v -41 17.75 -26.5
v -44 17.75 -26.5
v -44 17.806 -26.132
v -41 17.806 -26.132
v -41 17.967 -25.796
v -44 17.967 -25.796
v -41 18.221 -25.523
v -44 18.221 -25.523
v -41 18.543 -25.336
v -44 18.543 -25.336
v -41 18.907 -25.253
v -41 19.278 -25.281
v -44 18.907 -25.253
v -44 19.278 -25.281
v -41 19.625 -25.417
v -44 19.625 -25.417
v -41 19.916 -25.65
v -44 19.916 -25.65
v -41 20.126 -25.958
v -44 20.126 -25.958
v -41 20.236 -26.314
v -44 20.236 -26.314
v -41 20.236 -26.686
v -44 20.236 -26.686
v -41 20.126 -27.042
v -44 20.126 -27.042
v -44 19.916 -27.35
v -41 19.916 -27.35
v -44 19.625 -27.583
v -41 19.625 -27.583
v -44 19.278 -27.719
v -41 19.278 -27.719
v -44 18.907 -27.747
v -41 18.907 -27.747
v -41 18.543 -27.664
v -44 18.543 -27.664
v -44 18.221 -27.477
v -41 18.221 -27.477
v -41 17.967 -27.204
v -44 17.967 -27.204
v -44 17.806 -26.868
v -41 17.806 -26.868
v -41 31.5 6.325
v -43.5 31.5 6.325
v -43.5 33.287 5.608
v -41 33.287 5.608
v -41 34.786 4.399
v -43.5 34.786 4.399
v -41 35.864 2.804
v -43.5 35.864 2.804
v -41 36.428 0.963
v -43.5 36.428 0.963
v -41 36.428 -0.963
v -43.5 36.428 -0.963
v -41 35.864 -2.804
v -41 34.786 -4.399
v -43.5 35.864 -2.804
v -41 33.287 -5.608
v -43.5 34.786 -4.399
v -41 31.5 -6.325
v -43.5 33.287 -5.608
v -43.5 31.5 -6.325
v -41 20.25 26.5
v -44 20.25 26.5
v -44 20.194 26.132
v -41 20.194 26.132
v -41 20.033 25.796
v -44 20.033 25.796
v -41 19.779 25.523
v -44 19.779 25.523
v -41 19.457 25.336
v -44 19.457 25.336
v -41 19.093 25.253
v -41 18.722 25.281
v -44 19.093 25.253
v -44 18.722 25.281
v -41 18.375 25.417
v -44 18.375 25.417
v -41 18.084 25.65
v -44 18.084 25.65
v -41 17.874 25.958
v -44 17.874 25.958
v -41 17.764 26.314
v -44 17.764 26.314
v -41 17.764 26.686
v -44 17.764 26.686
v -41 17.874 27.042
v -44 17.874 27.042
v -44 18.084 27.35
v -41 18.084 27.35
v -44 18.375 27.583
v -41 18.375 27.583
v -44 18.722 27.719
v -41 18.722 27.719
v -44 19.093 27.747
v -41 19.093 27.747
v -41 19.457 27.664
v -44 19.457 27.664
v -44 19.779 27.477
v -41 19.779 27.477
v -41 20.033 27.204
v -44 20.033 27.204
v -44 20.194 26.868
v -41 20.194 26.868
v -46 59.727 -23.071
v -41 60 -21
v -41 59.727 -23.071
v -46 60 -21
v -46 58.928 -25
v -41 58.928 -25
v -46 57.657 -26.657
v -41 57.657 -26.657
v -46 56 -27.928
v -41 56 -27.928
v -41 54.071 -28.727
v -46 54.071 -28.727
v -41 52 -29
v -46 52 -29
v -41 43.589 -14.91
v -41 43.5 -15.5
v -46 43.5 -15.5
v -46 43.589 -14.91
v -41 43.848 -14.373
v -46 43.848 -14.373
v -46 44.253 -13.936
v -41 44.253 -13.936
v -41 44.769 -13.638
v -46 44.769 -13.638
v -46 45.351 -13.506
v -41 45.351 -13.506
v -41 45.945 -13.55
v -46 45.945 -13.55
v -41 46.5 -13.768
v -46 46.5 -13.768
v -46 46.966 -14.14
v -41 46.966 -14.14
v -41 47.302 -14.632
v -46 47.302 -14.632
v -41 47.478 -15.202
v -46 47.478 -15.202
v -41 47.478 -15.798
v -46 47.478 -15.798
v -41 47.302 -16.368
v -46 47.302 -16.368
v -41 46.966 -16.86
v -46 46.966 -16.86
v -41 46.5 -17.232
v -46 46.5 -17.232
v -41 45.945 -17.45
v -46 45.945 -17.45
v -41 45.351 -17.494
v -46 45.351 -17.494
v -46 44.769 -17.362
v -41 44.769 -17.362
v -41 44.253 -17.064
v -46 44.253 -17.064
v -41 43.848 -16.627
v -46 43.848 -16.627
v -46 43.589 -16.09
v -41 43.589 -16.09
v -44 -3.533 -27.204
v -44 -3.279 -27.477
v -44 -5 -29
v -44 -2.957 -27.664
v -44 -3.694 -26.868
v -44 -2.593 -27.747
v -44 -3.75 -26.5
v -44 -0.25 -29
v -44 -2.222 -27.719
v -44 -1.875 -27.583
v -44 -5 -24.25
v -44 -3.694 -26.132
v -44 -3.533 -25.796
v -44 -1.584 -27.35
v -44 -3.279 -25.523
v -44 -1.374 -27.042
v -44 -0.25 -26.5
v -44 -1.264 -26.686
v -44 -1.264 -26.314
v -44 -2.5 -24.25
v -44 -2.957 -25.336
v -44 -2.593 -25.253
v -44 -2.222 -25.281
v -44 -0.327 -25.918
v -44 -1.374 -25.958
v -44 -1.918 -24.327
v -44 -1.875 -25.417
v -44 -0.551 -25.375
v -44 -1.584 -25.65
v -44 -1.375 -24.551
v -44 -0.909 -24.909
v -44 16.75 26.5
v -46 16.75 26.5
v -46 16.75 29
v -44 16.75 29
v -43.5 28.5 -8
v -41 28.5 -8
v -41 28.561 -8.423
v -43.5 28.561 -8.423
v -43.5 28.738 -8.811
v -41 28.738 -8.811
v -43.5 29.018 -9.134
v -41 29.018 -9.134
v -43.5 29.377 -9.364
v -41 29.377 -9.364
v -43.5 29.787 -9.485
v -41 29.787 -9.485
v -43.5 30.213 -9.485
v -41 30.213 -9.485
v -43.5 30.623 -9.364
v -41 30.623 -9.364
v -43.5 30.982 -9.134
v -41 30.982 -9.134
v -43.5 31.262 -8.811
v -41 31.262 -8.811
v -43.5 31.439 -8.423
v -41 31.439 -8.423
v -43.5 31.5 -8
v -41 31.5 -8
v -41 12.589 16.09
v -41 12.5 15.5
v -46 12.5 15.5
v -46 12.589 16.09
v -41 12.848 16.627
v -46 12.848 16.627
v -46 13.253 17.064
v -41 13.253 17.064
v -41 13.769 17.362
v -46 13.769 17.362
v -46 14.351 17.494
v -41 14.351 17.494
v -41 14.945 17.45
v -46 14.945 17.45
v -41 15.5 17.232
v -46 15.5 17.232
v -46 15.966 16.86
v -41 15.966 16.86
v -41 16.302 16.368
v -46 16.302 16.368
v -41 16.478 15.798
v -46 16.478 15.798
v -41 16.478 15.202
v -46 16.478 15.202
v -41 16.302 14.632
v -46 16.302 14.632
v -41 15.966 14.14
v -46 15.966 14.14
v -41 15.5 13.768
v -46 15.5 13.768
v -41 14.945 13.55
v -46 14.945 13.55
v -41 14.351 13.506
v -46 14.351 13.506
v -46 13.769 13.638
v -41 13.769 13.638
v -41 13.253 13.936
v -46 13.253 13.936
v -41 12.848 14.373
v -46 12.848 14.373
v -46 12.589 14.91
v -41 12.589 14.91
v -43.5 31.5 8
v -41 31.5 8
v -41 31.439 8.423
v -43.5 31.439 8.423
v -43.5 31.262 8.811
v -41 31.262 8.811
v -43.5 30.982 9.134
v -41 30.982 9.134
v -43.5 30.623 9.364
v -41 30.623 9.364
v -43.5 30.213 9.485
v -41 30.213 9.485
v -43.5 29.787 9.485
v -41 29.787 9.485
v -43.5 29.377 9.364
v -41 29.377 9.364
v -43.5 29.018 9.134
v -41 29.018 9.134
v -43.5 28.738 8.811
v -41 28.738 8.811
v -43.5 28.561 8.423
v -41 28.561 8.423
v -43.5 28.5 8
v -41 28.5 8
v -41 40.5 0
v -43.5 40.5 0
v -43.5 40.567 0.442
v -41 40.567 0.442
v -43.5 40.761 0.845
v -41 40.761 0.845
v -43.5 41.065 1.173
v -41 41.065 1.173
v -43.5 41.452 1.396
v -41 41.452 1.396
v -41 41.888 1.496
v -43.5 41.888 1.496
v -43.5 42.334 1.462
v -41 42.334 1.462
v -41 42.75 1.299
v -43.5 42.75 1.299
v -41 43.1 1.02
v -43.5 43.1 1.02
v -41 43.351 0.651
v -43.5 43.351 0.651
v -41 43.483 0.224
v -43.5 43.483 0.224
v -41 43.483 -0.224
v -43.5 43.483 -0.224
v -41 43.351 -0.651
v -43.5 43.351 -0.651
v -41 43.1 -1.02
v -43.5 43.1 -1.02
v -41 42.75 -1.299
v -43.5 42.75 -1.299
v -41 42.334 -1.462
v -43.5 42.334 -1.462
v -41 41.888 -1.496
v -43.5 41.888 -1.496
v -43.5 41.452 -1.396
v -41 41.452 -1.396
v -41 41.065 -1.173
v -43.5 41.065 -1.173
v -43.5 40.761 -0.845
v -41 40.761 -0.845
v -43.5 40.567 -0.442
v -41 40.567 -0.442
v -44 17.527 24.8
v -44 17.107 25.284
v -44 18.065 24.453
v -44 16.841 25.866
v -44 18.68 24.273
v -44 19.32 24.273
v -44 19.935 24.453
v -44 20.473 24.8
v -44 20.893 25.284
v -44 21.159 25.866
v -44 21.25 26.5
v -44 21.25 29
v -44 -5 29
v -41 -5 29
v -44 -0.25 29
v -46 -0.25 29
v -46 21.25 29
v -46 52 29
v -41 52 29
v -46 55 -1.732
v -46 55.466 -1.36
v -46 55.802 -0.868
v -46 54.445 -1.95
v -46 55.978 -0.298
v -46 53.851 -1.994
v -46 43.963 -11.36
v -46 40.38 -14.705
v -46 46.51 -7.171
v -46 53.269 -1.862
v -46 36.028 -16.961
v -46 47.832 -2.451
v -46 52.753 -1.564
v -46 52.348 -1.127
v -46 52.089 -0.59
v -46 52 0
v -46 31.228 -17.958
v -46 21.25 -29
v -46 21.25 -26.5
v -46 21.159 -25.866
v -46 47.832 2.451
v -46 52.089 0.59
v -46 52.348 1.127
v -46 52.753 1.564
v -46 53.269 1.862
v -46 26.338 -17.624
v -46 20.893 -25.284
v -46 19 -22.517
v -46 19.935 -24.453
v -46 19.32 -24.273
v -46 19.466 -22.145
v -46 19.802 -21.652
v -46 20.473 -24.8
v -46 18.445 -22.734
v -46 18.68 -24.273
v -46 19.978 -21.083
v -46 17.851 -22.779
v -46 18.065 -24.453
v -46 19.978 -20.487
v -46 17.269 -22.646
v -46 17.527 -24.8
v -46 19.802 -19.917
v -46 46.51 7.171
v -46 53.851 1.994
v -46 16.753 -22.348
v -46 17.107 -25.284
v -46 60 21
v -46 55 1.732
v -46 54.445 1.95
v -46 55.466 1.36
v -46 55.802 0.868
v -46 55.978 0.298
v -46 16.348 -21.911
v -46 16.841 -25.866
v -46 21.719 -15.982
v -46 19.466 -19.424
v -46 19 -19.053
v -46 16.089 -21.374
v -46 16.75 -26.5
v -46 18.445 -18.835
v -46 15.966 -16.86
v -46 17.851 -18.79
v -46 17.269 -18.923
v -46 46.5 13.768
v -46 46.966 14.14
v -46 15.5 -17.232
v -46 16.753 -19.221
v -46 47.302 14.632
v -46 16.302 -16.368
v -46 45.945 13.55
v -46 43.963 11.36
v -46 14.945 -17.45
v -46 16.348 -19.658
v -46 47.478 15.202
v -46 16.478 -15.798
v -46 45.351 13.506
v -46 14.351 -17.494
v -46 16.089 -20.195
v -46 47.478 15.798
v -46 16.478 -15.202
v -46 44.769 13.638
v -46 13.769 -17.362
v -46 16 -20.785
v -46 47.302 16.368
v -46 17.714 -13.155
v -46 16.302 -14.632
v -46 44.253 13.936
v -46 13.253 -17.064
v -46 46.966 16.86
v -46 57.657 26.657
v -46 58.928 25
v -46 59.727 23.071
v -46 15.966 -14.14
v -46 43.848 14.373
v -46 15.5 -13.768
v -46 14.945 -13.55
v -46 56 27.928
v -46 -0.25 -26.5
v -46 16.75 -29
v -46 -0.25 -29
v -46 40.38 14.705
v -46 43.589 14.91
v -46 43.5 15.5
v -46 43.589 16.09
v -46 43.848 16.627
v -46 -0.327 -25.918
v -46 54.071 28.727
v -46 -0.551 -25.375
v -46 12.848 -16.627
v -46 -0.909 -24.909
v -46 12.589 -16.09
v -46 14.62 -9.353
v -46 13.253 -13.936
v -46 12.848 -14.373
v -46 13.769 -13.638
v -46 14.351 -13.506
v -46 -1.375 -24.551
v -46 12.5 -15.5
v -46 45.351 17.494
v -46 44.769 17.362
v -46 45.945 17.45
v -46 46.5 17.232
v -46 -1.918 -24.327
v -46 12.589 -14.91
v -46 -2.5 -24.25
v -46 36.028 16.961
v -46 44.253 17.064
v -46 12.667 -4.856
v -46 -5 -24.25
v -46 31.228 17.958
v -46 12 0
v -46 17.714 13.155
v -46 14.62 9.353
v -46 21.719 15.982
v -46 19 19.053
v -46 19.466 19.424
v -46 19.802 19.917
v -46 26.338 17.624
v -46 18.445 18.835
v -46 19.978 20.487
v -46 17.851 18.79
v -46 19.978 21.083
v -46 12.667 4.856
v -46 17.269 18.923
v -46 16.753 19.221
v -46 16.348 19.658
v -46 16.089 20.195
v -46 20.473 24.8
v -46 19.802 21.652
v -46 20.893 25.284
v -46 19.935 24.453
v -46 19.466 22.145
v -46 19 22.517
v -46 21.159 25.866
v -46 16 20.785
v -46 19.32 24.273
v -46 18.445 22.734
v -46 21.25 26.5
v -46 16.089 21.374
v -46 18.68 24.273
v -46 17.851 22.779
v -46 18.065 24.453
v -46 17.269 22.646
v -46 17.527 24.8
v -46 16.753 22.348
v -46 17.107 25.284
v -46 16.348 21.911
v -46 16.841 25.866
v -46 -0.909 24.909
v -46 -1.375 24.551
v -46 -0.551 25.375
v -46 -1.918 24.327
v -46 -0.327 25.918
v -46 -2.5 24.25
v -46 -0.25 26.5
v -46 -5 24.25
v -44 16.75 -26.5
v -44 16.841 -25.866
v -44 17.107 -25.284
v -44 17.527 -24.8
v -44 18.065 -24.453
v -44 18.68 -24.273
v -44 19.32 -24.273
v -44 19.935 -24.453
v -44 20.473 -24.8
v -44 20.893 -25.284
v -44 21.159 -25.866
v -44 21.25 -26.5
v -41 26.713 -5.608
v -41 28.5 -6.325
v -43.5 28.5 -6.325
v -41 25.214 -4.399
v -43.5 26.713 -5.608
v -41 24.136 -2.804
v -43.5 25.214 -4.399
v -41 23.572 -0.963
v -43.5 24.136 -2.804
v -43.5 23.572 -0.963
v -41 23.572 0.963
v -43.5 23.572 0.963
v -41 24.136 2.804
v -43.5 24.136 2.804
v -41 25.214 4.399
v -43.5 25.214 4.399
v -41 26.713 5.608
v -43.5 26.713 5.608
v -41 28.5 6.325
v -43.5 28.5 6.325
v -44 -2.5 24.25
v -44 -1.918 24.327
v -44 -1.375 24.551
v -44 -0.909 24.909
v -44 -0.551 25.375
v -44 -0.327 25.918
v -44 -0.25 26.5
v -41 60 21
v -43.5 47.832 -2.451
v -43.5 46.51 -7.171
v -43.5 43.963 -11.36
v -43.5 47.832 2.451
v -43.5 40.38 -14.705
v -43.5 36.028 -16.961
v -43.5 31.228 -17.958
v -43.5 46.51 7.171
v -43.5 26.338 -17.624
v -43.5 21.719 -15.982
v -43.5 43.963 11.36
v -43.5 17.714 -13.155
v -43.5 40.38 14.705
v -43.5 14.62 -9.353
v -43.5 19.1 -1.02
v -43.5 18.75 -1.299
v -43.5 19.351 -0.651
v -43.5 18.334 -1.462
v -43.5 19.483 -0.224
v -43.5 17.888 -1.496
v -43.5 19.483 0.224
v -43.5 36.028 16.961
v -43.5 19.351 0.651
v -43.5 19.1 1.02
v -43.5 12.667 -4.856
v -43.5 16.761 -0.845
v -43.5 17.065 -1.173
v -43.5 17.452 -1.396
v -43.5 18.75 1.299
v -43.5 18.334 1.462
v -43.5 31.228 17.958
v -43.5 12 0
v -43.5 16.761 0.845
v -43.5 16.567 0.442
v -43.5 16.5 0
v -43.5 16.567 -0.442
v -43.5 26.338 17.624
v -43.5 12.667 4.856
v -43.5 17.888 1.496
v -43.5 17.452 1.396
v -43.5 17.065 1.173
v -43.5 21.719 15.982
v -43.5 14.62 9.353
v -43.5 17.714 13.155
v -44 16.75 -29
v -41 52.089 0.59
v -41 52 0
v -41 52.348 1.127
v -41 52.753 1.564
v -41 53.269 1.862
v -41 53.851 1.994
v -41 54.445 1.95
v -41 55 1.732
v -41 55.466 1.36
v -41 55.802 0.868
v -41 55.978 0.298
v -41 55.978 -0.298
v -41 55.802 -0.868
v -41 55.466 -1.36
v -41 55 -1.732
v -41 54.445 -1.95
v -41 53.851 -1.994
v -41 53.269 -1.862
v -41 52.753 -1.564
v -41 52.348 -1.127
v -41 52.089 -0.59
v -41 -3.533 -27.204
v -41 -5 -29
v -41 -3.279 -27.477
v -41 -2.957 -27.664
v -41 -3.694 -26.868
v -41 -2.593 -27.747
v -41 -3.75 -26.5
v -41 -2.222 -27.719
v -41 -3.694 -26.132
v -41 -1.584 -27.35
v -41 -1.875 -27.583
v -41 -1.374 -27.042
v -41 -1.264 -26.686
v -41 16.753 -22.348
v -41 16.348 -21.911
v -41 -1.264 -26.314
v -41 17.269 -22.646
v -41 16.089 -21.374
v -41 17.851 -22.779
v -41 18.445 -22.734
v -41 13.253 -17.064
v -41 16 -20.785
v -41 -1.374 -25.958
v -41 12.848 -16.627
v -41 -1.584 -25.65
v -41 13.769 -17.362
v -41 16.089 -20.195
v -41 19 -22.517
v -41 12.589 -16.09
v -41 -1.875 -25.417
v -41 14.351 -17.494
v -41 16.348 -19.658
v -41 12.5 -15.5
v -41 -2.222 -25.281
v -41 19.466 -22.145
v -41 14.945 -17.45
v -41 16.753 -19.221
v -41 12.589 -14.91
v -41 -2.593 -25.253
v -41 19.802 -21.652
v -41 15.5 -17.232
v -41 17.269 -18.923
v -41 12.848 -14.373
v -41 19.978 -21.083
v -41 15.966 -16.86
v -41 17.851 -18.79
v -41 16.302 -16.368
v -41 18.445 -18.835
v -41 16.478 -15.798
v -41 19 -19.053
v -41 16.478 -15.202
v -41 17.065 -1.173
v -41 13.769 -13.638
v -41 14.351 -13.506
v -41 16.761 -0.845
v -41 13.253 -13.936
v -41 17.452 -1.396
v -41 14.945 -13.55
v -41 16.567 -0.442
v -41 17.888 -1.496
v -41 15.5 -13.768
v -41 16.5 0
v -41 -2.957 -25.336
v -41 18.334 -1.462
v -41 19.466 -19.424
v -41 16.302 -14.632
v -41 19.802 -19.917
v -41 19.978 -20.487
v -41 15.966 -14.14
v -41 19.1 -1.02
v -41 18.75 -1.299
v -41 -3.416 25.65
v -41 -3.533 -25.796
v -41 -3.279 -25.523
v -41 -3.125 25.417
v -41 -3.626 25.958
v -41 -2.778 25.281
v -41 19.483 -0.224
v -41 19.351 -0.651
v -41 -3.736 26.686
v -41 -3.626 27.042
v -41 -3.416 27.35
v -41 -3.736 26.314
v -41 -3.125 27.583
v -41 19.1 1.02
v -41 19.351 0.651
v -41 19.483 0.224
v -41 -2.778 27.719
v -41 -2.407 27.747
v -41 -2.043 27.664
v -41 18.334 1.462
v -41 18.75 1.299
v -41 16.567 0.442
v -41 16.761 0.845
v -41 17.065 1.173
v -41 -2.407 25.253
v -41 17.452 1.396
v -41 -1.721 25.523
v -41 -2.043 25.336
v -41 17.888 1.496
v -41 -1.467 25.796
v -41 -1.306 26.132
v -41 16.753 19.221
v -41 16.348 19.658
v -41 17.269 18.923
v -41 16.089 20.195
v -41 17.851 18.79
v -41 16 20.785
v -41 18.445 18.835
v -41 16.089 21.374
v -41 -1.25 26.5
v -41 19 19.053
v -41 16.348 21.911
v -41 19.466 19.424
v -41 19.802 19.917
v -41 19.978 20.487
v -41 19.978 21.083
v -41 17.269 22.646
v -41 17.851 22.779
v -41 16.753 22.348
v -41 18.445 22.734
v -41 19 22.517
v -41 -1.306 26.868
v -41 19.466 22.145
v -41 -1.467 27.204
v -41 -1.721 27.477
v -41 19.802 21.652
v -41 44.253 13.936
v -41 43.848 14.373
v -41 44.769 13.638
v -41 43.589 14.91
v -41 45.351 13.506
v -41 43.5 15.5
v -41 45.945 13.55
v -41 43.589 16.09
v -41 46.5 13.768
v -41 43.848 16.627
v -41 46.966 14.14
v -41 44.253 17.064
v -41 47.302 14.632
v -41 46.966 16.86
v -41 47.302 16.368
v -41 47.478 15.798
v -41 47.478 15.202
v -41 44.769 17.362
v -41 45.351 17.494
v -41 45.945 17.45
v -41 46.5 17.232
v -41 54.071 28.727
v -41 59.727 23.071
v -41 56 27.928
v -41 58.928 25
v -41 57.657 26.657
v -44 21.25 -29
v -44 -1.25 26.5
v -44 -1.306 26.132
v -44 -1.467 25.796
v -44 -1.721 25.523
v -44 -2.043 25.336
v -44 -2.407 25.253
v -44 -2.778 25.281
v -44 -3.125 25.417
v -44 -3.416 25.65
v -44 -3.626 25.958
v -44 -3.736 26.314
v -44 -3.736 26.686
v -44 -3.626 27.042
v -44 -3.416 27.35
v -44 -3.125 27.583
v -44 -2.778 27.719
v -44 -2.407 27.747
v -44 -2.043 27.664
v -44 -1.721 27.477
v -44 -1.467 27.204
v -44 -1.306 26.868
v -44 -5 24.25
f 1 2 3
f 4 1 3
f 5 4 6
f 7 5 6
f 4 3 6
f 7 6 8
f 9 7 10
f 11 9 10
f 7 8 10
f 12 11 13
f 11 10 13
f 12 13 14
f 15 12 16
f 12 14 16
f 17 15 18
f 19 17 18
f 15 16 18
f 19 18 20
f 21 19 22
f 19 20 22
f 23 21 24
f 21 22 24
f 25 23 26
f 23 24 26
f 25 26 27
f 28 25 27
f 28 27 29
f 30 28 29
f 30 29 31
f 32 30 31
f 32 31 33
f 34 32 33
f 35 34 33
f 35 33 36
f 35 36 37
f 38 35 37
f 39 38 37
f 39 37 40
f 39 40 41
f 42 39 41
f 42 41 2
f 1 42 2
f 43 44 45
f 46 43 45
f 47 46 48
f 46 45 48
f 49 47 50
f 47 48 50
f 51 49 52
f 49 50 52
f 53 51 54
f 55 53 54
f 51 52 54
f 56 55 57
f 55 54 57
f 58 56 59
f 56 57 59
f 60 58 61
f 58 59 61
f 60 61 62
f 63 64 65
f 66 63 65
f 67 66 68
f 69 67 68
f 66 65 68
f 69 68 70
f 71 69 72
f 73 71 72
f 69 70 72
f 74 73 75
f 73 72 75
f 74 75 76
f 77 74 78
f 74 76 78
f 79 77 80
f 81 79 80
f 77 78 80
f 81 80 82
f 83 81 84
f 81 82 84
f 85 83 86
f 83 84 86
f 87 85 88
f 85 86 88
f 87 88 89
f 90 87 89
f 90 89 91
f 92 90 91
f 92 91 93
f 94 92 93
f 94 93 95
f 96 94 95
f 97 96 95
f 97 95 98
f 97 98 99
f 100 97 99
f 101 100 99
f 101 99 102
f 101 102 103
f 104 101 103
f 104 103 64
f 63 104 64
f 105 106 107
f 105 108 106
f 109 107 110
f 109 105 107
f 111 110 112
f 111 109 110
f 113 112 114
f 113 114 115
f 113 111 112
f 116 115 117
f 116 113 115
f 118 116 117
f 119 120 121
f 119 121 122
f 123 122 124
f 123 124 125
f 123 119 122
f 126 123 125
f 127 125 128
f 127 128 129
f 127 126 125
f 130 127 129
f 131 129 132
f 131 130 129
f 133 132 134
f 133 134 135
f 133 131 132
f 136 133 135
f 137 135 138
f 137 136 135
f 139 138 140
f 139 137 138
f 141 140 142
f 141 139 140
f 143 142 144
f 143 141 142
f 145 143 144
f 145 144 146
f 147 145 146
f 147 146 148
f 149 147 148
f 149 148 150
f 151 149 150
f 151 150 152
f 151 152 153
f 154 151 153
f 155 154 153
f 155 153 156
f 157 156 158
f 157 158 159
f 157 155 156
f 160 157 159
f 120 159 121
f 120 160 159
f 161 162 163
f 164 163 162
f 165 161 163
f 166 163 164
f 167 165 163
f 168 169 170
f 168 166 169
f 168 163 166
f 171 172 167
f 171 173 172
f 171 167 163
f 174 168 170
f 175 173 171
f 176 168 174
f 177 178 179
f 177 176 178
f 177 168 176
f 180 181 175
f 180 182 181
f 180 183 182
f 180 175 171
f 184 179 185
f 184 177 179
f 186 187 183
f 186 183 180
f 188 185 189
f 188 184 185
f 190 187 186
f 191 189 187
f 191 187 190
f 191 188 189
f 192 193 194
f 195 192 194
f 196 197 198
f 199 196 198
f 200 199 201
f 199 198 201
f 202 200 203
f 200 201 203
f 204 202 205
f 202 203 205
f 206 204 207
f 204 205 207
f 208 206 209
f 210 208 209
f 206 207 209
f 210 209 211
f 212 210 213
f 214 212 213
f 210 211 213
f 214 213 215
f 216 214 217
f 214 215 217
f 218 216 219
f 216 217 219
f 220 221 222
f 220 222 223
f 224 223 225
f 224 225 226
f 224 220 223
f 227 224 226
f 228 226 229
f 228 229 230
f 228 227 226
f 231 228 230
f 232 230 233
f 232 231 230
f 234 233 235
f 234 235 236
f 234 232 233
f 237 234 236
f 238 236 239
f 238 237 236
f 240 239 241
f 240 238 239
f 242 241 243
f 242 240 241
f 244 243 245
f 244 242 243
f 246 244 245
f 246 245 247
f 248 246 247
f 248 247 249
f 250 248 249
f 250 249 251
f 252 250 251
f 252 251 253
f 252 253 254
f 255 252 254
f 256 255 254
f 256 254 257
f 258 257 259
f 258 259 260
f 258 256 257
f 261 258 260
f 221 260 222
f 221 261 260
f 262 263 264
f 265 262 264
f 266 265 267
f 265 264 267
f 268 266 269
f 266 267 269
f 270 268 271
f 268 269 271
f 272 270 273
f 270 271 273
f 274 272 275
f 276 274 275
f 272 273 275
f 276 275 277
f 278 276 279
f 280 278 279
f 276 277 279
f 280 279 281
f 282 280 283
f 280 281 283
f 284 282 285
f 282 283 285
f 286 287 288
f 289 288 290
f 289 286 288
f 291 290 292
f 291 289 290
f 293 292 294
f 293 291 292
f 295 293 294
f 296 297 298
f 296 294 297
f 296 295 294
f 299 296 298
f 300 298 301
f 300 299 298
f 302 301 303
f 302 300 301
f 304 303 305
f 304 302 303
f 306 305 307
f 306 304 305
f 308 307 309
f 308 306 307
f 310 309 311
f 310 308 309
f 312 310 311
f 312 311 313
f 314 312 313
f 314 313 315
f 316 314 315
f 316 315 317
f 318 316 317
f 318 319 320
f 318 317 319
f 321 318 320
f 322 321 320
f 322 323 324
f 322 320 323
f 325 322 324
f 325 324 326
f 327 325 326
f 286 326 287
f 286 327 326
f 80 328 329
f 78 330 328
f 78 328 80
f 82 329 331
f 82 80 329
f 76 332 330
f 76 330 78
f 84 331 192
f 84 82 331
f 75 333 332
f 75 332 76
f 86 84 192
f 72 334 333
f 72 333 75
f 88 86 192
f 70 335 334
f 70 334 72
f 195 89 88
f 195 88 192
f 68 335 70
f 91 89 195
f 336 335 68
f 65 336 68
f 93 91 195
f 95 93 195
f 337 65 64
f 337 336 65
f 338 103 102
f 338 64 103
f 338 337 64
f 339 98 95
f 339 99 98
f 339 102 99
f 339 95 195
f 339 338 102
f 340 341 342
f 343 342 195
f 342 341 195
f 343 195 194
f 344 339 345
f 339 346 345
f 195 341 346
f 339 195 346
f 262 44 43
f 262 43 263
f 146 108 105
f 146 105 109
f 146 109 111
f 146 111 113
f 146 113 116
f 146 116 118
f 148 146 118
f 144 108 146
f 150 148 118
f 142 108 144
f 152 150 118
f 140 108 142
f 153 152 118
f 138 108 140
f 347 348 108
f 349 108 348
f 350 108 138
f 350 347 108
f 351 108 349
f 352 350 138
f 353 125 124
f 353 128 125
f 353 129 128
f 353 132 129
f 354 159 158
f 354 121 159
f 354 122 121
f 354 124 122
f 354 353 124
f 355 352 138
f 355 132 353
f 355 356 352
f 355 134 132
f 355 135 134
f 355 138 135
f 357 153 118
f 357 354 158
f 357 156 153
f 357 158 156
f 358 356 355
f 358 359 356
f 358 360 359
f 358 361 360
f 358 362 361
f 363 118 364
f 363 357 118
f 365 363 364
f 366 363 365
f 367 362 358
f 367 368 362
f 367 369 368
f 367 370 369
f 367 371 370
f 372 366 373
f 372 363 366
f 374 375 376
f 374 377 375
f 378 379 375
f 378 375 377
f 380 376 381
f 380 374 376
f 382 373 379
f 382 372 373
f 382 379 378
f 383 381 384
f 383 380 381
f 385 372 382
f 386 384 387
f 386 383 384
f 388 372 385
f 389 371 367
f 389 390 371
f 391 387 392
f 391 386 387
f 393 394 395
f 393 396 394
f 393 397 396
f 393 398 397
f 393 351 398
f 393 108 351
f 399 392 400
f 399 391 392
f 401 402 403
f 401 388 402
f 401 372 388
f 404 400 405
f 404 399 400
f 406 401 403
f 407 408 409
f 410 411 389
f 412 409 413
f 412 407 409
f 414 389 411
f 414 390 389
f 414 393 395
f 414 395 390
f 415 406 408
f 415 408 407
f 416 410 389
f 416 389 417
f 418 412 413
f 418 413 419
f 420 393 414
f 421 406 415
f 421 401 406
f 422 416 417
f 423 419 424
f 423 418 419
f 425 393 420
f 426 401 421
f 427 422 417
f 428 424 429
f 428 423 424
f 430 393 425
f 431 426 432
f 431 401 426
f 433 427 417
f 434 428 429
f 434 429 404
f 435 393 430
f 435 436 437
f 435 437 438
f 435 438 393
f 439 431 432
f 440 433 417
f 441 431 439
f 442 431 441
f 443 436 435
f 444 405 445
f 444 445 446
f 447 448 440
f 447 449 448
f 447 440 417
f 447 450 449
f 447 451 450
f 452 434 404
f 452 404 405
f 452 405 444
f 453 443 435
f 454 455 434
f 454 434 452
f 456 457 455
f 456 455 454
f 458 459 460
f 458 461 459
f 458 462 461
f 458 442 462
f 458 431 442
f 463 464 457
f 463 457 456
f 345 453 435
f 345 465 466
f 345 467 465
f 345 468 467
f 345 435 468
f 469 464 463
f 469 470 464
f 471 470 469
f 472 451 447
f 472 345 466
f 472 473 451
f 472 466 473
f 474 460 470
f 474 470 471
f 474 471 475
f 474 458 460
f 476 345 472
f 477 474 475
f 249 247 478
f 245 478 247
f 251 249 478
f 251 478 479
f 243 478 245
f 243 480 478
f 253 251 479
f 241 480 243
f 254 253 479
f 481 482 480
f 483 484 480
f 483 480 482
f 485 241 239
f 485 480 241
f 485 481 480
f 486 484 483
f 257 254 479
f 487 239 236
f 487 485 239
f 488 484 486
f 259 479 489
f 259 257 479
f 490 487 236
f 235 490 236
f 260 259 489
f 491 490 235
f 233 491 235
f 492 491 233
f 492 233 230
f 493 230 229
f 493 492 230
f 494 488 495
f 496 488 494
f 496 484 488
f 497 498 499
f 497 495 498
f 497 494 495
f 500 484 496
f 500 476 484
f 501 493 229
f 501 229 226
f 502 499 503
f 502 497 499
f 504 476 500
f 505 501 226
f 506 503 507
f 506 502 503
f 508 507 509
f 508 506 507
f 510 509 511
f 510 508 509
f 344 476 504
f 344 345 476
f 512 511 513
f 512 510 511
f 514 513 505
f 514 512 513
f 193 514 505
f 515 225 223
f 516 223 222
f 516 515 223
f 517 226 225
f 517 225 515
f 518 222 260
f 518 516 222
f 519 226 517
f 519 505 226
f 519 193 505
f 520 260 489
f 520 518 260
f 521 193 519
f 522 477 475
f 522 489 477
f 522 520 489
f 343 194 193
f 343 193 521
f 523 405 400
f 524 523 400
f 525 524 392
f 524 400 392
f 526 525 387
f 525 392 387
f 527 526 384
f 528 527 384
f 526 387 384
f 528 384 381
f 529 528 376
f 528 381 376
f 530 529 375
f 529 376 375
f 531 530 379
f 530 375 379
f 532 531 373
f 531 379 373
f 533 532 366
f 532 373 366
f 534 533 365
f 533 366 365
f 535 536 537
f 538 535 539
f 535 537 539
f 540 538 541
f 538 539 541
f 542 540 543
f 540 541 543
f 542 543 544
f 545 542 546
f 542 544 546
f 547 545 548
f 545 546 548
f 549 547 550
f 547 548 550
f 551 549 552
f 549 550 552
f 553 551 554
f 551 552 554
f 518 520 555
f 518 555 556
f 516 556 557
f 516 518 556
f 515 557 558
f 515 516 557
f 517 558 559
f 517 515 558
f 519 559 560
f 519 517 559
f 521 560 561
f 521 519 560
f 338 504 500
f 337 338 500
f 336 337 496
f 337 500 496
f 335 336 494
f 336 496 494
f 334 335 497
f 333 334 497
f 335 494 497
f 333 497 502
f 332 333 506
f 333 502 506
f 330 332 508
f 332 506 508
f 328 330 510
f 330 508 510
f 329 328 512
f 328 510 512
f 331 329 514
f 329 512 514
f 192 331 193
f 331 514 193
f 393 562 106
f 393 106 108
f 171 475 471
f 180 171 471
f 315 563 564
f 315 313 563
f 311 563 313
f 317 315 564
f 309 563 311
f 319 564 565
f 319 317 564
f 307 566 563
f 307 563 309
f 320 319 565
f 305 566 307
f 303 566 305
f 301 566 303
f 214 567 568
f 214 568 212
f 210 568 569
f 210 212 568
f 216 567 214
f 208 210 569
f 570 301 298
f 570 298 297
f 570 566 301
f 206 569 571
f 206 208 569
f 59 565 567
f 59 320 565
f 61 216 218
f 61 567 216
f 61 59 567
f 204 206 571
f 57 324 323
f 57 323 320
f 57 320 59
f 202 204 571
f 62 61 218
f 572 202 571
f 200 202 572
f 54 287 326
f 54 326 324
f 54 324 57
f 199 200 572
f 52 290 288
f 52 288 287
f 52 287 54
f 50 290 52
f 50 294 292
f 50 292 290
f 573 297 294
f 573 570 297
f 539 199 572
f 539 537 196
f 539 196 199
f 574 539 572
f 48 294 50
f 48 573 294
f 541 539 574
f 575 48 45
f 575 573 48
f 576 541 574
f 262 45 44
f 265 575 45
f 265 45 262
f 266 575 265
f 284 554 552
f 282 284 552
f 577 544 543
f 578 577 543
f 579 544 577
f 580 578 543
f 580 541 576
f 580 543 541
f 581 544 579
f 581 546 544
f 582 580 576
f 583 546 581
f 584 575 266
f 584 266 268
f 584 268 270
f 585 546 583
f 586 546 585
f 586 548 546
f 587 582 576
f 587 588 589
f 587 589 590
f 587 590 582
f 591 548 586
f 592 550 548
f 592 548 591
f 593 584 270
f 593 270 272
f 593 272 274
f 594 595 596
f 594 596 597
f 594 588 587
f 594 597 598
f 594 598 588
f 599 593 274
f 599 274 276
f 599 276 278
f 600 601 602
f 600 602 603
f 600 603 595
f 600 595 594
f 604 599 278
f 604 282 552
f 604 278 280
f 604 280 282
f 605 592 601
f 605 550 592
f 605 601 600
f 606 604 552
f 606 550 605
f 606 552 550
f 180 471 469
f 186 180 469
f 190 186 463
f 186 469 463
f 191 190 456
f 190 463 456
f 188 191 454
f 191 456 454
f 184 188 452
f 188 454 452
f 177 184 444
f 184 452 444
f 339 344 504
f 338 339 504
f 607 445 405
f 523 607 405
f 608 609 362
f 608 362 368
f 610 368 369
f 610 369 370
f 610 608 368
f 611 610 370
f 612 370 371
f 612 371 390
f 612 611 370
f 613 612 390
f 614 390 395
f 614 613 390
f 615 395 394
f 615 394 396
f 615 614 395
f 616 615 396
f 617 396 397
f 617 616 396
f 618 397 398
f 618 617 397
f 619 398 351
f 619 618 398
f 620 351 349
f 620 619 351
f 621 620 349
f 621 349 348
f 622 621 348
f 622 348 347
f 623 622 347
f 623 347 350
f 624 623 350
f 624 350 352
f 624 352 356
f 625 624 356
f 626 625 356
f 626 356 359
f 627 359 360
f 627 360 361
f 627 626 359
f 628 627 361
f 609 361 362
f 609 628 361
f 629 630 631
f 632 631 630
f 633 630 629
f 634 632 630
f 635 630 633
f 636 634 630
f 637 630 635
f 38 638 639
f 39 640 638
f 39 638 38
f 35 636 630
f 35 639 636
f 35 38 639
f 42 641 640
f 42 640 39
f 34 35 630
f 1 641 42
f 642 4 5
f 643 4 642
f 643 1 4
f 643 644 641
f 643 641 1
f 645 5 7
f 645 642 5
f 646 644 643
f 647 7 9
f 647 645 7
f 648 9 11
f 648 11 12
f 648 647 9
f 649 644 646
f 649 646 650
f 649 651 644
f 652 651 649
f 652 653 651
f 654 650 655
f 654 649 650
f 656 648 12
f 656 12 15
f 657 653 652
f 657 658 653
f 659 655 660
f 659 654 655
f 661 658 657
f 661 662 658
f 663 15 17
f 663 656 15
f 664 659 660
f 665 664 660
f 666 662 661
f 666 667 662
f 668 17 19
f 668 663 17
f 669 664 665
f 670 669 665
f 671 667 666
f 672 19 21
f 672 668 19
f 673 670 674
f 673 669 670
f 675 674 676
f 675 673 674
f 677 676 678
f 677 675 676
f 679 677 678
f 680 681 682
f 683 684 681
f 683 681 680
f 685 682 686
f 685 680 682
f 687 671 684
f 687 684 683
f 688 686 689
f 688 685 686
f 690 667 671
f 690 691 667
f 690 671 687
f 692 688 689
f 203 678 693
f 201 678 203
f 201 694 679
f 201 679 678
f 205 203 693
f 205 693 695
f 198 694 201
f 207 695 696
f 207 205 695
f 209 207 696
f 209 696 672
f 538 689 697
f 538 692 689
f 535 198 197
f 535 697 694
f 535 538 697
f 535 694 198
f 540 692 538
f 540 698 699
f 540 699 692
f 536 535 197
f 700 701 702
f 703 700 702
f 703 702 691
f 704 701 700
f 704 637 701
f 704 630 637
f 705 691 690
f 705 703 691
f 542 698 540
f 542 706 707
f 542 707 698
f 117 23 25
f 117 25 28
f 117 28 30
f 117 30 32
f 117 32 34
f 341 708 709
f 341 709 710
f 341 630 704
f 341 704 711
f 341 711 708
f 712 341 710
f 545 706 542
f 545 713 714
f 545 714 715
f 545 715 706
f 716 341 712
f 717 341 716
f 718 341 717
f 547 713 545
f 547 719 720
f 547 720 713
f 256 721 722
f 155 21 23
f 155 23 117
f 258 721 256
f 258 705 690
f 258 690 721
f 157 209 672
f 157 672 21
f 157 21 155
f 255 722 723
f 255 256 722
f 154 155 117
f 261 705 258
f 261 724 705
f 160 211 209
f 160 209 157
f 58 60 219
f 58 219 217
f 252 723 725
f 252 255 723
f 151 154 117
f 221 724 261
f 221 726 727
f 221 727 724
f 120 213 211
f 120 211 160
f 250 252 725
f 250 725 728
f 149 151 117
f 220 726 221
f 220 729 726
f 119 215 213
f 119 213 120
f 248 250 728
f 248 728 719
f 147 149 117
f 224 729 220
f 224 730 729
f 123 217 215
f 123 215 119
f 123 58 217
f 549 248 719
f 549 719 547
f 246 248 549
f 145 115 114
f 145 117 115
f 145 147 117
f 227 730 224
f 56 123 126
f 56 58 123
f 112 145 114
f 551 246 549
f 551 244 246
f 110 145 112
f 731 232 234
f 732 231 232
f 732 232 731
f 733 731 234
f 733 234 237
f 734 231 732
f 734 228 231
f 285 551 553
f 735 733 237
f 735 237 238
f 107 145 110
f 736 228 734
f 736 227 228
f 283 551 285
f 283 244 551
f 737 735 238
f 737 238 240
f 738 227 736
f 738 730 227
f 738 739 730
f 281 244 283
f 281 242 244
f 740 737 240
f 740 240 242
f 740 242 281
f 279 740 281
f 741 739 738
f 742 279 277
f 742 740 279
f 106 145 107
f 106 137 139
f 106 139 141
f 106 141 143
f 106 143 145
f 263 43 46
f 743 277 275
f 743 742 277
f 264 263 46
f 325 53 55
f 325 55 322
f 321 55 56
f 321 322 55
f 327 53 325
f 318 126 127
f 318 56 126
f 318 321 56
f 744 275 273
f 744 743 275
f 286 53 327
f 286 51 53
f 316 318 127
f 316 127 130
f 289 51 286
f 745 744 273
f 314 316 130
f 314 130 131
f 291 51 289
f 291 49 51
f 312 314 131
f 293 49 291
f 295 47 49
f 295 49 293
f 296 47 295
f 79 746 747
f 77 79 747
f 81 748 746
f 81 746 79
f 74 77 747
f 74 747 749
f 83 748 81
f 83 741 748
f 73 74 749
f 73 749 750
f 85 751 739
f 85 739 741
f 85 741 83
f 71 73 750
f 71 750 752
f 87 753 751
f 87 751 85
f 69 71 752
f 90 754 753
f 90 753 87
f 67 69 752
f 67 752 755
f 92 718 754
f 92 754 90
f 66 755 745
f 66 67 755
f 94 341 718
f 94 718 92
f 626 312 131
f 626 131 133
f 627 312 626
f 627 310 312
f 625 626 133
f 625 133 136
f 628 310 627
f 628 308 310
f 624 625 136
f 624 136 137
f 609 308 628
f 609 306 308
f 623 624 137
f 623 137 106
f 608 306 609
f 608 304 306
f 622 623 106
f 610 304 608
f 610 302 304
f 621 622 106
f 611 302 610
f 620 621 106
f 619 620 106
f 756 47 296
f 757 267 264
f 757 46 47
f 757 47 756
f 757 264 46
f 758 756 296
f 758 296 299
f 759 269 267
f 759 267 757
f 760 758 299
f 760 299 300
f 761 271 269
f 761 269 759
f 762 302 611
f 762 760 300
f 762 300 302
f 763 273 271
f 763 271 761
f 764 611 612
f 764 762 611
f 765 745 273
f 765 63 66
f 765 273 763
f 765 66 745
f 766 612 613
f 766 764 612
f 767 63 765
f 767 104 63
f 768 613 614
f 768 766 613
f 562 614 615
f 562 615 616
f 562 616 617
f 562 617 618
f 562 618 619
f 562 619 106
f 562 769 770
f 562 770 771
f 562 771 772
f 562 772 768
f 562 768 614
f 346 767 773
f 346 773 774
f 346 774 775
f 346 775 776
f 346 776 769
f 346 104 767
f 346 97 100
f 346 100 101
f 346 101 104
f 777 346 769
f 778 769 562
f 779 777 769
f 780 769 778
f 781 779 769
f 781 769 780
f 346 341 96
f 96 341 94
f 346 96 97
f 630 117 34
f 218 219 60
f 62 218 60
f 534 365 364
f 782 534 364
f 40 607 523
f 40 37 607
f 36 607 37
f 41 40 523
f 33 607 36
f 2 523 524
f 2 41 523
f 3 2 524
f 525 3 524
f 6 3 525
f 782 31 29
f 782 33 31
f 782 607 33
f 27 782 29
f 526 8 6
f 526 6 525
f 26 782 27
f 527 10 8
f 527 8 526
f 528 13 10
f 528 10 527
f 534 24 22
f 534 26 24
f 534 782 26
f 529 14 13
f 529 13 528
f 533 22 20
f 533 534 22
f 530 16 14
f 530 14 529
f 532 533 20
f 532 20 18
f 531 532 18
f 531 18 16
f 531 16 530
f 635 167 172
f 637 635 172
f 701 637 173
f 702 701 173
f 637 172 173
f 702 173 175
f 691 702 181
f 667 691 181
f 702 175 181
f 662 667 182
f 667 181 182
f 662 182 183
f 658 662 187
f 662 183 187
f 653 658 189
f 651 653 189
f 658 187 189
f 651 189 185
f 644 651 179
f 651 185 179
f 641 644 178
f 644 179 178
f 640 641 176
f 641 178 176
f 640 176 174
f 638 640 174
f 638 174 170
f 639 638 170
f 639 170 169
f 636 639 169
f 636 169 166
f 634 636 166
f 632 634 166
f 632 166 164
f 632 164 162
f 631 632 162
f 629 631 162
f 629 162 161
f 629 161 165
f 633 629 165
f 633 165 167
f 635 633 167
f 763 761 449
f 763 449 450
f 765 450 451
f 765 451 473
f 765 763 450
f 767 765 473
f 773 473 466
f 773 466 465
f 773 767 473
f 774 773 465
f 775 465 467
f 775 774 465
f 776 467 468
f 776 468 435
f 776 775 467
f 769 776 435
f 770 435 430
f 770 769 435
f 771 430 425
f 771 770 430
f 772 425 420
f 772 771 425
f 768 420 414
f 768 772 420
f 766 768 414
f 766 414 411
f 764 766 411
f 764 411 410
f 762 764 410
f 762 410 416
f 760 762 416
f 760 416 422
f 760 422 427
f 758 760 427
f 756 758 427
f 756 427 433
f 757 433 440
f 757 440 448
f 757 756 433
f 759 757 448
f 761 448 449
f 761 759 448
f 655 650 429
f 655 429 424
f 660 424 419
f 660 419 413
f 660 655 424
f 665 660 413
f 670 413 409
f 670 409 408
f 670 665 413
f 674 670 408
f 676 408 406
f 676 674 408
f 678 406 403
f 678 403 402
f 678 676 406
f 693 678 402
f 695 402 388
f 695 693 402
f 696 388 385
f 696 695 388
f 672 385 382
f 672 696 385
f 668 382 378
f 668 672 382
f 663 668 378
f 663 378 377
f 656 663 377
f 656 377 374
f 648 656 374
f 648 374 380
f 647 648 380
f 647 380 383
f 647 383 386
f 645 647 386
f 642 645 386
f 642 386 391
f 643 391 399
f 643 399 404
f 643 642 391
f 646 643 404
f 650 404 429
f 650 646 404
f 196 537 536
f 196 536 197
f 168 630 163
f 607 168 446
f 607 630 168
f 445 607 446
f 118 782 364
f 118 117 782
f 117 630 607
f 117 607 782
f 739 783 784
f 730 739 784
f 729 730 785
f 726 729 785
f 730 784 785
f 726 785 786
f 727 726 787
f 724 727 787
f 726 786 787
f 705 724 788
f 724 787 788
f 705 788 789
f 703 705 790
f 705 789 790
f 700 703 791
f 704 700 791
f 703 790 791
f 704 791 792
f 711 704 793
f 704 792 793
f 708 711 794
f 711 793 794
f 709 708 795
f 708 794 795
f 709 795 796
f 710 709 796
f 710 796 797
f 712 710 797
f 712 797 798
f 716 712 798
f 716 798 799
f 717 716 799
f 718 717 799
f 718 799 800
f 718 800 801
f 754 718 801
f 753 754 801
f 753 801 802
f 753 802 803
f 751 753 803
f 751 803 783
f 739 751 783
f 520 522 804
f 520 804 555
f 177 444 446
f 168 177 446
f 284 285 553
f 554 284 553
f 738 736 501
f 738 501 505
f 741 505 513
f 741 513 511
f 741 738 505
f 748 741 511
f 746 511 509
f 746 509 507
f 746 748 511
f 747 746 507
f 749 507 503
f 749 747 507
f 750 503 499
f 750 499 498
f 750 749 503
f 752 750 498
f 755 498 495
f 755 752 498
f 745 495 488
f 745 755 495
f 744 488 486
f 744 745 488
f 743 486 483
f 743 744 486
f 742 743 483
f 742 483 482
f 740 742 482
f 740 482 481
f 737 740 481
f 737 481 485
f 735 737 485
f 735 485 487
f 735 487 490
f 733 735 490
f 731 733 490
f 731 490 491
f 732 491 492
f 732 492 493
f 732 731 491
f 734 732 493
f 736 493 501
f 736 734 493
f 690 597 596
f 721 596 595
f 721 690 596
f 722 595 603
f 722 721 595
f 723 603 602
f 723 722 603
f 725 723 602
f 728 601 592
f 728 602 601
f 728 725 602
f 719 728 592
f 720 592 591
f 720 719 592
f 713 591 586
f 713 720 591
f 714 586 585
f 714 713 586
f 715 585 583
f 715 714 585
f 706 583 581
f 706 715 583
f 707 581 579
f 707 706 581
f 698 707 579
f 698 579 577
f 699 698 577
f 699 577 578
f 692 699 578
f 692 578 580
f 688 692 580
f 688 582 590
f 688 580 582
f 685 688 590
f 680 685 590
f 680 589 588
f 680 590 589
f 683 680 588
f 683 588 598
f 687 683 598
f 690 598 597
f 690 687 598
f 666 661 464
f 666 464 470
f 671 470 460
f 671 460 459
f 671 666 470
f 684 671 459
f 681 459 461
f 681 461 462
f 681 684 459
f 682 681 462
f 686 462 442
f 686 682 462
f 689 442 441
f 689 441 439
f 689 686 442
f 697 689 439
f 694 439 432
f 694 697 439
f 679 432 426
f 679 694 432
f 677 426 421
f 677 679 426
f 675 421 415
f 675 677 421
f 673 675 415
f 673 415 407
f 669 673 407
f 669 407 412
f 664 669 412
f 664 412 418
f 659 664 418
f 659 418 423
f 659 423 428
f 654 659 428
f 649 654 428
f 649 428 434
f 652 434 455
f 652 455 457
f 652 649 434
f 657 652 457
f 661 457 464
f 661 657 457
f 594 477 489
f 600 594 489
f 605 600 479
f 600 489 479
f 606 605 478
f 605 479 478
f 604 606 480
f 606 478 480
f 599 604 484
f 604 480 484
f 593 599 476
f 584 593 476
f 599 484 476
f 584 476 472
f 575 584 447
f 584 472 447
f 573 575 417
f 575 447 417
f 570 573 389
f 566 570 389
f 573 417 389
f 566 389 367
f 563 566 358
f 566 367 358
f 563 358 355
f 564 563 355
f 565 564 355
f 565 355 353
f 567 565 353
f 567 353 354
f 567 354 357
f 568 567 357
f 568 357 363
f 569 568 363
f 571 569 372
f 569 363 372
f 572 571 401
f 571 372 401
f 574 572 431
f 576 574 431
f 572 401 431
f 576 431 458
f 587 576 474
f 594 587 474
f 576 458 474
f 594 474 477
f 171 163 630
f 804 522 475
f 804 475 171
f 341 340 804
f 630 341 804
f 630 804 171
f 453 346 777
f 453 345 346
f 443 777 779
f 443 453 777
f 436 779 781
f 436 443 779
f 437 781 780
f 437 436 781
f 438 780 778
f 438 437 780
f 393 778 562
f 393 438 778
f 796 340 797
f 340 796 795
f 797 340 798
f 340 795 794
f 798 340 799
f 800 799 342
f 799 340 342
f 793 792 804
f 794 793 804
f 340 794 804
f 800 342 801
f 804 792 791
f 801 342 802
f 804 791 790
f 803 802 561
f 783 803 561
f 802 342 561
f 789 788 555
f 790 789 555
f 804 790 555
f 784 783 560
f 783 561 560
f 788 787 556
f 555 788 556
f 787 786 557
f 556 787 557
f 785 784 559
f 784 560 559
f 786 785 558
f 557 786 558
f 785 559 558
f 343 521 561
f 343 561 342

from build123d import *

# Parameters (mm, degrees)
RESSALTO_EXTRUS_O1_DEPTH  = 29
CORTE_EXTRUS_O1_REACH     = 115.6
ESBO_O2_R                 = 6.5
ESBO_O3_R                 = 18
CORTE_EXTRUS_O2_DEPTH     = 2.5
CORTE_EXTRUS_O3_START     = -5
ESBO_O5_R                 = 2
ESBO_O5_R_2               = 1.5
CORTE_EXTRUS_O3_DEPTH     = 5
ESBO_O7_R                 = 12
ESBO_O7_R_2               = 2
CORTE_EXTRUS_O4_DEPTH     = 110.590145542
ESBO_O11_W                = 18
ESBO_O11_H                = 10
RESSALTO_EXTRUS_O3_DEPTH  = 8
ESBO_O12_W                = 14.4
ESBO_O12_H                = 6.8
CORTE_EXTRUS_O6_DEPTH     = 3
ESBO_O13_W                = 13.4
ESBO_O13_H                = 5.8
CORTE_EXTRUS_O7_DEPTH     = 5
CORTE_EXTRUS_O8_REACH     = 84.898
RESSALTO_EXTRUS_O4_DEPTH  = 5
ESBO_O17_W                = 2.6
ESBO_O17_H                = 10
RESSALTO_EXTRUS_O5_DEPTH  = 8
CHANFRO1_SIZE             = 5
FILETE1_R                 = 8
ESBO_O18_W                = 20
ESBO_O18_H                = 8
RESSALTO_EXTRUS_O6_DEPTH  = 13
ESBO_O19_R                = 2.25
CORTE_EXTRUS_O9_DEPTH     = 80.252760204
CHANFRO2_SIZE             = 3
CHANFRO2_SIZE_2           = 13
CORTE_EXTRUS_O10_START    = -6
CORTE_EXTRUS_O10_DEPTH    = 74.252760204
ESBO_O21_W                = 26
ESBO_O21_H                = 16
RESSALTO_EXTRUS_O7_DEPTH  = 30
CORTE_EXTRUS_O11_DEPTH    = 26
ESBO_O24_R                = 1
ESBO_O24_W                = 17.2
ESBO_O24_H                = 3
RESSALTO_EXTRUS_O8_DEPTH  = 3
ESBO_O25_W                = 11.2
ESBO_O25_H                = 4
CORTE_EXTRUS_O12_DEPTH    = 2
ESBO_O26_R                = 3.5
CORTE_EXTRUS_O13_DEPTH    = 96.289033997
ESBO_O27_W                = 24
ESBO_O27_H                = 8
RESSALTO_EXTRUS_O9_DEPTH  = 6
ESBO_O28_W                = 1.5
ESBO_O28_H                = 8
RESSALTO_EXTRUS_O10_DEPTH = 2
ESBO_O31_R                = 1
CORTE_EXTRUS_O14_DEPTH    = 85.172442046
ESBO_O32_R                = 1
CORTE_EXTRUS_O15_DEPTH    = 12
ESBO_O33_R                = 1.25
CORTE_EXTRUS_O16_DEPTH    = 5
CORTE_EXTRUS_O17_DEPTH    = 2
ESBO_O37_R                = 54.092518309
CORTE_EXTRUS_O19_DEPTH    = 114.723348526


with BuildPart() as part:
    # Esboço1 → Ressalto-extrusão1 (new, symmetric)
    with BuildSketch(Plane.XY):
        Polygon((0, 0), (-41, 0), (-41, 60), (-46, 60), (-46, -5), (46, -5), (46, 60), (41, 60), (41, 0), align=None)
    extrude(amount=RESSALTO_EXTRUS_O1_DEPTH, both=True)

    # Esboço2 → Corte-extrusão1 (cut, up to next)
    with BuildSketch(Plane.ZY.offset(46), mode=Mode.PRIVATE) as corte_extrus_o1_sk1:
        with Locations(Location((0, 30, 0), (0, 0, 270))):
            Circle(ESBO_O2_R)
    corte_extrus_o1_tool1 = extrude(corte_extrus_o1_sk1.sketch, amount=-CORTE_EXTRUS_O1_REACH, mode=Mode.PRIVATE) & part.part
    add(corte_extrus_o1_tool1.solids().sort_by_distance((-46, 30, 0))[0], mode=Mode.SUBTRACT)

    # Esboço3 → Corte-extrusão2 (cut)
    with BuildSketch(Plane.ZY.offset(46)):
        with Locations(Location((0, 30, 0), (0, 0, 270))):
            Circle(ESBO_O3_R)
    extrude(amount=-CORTE_EXTRUS_O2_DEPTH, mode=Mode.SUBTRACT)

    # Esboço5 → Corte-extrusão3 (cut)
    with BuildSketch(Plane.ZY.offset(46).offset(CORTE_EXTRUS_O3_START)):
        with Locations(Location((-15.5, 45.5, 0), (0, 0, 270))):
            Circle(ESBO_O5_R)
        with Locations(Location((0, 42, 0), (0, 0, 270))):
            Circle(ESBO_O5_R_2)
        with Locations(Location((0, 18, 0), (0, 0, 270))):
            Circle(ESBO_O5_R_2)
        with Locations(Location((0, 54, 0), (0, 0, 270))):
            Circle(ESBO_O5_R)
        with Locations(Location((15.5, 45.5, 0), (0, 0, 270))):
            Circle(ESBO_O5_R)
        with Locations(Location((15.5, 14.5, 0), (0, 0, 270))):
            Circle(ESBO_O5_R)
        with Locations(Location((-15.5, 14.5, 0), (0, 0, 270))):
            Circle(ESBO_O5_R)
        with Locations(Location((20.784609691, 18, 0), (0, 0, 270))):
            Circle(ESBO_O5_R)
        with Locations(Location((-20.784609691, 18, 0), (0, 0, 270))):
            Circle(ESBO_O5_R)
        with BuildLine():
            Line((-8, 31.5), (8, 31.5))
            ThreePointArc((8, 31.5), (9.5, 30), (8, 28.5))
            Line((8, 28.5), (-8, 28.5))
            ThreePointArc((-8, 28.5), (-9.5, 30), (-8, 31.5))
        make_face()
    extrude(amount=CORTE_EXTRUS_O3_DEPTH, mode=Mode.SUBTRACT)

    # Esboço7 → Corte-extrusão4 (cut, through all)
    with BuildSketch(Plane.ZY.offset(-41)):
        with Locations(Location((0, 30, 0), (0, 0, 270))):
            Circle(ESBO_O7_R)
        with Locations(Location((-15.5, 45.5, 0), (0, 0, 270))):
            Circle(ESBO_O7_R_2)
        with Locations(Location((15.5, 45.5, 0), (0, 0, 270))):
            Circle(ESBO_O7_R_2)
        with Locations(Location((15.5, 14.5, 0), (0, 0, 270))):
            Circle(ESBO_O7_R_2)
        with Locations(Location((-15.5, 14.5, 0), (0, 0, 270))):
            Circle(ESBO_O7_R_2)
    extrude(amount=-CORTE_EXTRUS_O4_DEPTH, mode=Mode.SUBTRACT)

    # Esboço11 → Ressalto-extrusão3 (add)
    with BuildSketch(Plane(origin=(0, 0, 0), x_dir=(1, 0, 0), z_dir=(0, 1, 0))):
        with Locations((-29.4, 0)):
            Rectangle(ESBO_O11_W, ESBO_O11_H)
    extrude(amount=RESSALTO_EXTRUS_O3_DEPTH)

    # Esboço12 → Corte-extrusão6 (cut)
    with BuildSketch(Plane(origin=(0, 8, 0), x_dir=(1, 0, 0), z_dir=(0, 1, 0))):
        with Locations((-29.4, 0)):
            Rectangle(ESBO_O12_W, ESBO_O12_H)
    extrude(amount=-CORTE_EXTRUS_O6_DEPTH, mode=Mode.SUBTRACT)

    # Esboço13 → Corte-extrusão7 (cut)
    with BuildSketch(Plane(origin=(0, 5, 0), x_dir=(1, 0, 0), z_dir=(0, 1, 0))):
        with Locations((-29.4, 0)):
            Rectangle(ESBO_O13_W, ESBO_O13_H)
    extrude(amount=-CORTE_EXTRUS_O7_DEPTH, mode=Mode.SUBTRACT)

    # Esboço14 → Corte-extrusão8 (cut, up to next)
    with BuildSketch(Plane.XY.offset(5), mode=Mode.PRIVATE) as corte_extrus_o8_sk1:
        with BuildLine():
            Line((-33.4, 0), (-25.4, 0))
            ThreePointArc((-25.4, 0), (-29.4, 4), (-33.4, 0))
        make_face()
    corte_extrus_o8_tool1 = extrude(corte_extrus_o8_sk1.sketch, amount=-CORTE_EXTRUS_O8_REACH, mode=Mode.PRIVATE) & part.part
    add(corte_extrus_o8_tool1.solids().sort_by_distance((-29.4, 1.697653, 5))[0], mode=Mode.SUBTRACT)

    # Esboço16 → Ressalto-extrusão4 (add)
    with BuildSketch(Plane.XY.offset(29)):
        Polygon((-41, 32), (-21, 12), (21, 12), (41, 32), (41, 0), (-41, 0), align=None)
    ressalto_extrus_o4 = extrude(amount=-RESSALTO_EXTRUS_O4_DEPTH)

    # Espelhar1: Ressalto-extrusão4 across plane
    add(ressalto_extrus_o4.mirror(Plane.XY))

    # Esboço17 → Ressalto-extrusão5 (add)
    with BuildSketch(Plane(origin=(0, 8, 0), x_dir=(1, 0, 0), z_dir=(0, 1, 0))):
        with Locations((-39.7, 0)):
            Rectangle(ESBO_O17_W, ESBO_O17_H)
    extrude(amount=-RESSALTO_EXTRUS_O5_DEPTH)

    # Chanfro1
    chanfro1_edges = [part.edges().sort_by_distance(p)[0] for p in [
        (41, 0, 0),
        (-41, 0, 14.5),
        (-41, 0, -14.5),
    ]]
    chamfer(chanfro1_edges, length=CHANFRO1_SIZE)

    # Filete1
    filete1_edges = [part.edges().sort_by_distance(p)[0] for p in [
        (-43.5, 60, -29),
        (-43.5, 60, 29),
        (-41, 32, 26.5),
        (-21, 12, 26.5),
        (21, 12, 26.5),
        (41, 32, 26.5),
        (-41, 32, -26.5),
        (41, 32, -26.5),
        (21, 12, -26.5),
        (-21, 12, -26.5),
        (43.5, 60, 29),
        (43.5, 60, -29),
    ]]
    fillet(filete1_edges, radius=FILETE1_R)

    # Esboço18 → Ressalto-extrusão6 (add)
    with BuildSketch(Plane.XY.offset(29)):
        with Locations((22, 7)):
            Rectangle(ESBO_O18_W, ESBO_O18_H)
    extrude(amount=RESSALTO_EXTRUS_O6_DEPTH)

    # Esboço19 → Corte-extrusão9 (cut, through all)
    with BuildSketch(Plane(origin=(0, 11, 0), x_dir=(1, 0, 0), z_dir=(0, 1, 0))):
        with Locations(Location((18, -35.75, 0), (0, 0, 270))):
            Circle(ESBO_O19_R)
        with Locations(Location((26, -35.75, 0), (0, 0, 270))):
            Circle(ESBO_O19_R)
    extrude(amount=-CORTE_EXTRUS_O9_DEPTH, mode=Mode.SUBTRACT)

    # Chanfro2
    # the kernel refuses this chamfer: 13, 3 mm, written as the material it adds along each edge
    with BuildSketch(Plane(origin=(12, 3, 29), x_dir=(0, -0.987043568605235, -0.1604524654688814), z_dir=(1, 0, 0))) as chanfro2_piece_1_section:
        Polygon((CHANFRO2_SIZE * 0.987043568605, -CHANFRO2_SIZE * 0.160452465469), (-CHANFRO2_SIZE_2 * 0.160452465469, -CHANFRO2_SIZE_2 * 0.987043568605), (0, 0), align=None)
    chanfro2_piece_1 = extrude(amount=20, mode=Mode.PRIVATE)
    chanfro2_piece_1 = split(chanfro2_piece_1, bisect_by=Plane(origin=(21.999997786, 2.099377296, 42), z_dir=(0, 0, -1)), keep=Keep.TOP, mode=Mode.PRIVATE)
    chanfro2_piece_1 = chanfro2_piece_1 - Plane(origin=(18, 2.099377296, 35.75), x_dir=(0, 0, 1), z_dir=(0, 1, 0)) * Cylinder(2.25, 92, mode=Mode.PRIVATE)
    chanfro2_piece_1 = chanfro2_piece_1 - Plane(origin=(26, 2.099377296, 35.75), x_dir=(0, 0, 1), z_dir=(0, 1, 0)) * Cylinder(2.25, 92, mode=Mode.PRIVATE)
    add(chanfro2_piece_1)

    # Esboço20 → Corte-extrusão10 (cut, through all)
    with BuildSketch(Plane(origin=(0, 11, 0), x_dir=(1, 0, 0), z_dir=(0, 1, 0)).offset(CORTE_EXTRUS_O10_START)):
        with BuildLine():
            Line((18, -31.5), (26, -31.5))
            ThreePointArc((26, -31.5), (30.25, -35.75), (26, -40))
            Line((26, -40), (18, -40))
            ThreePointArc((18, -40), (13.75, -35.75), (18, -31.5))
        make_face()
    extrude(amount=-CORTE_EXTRUS_O10_DEPTH, mode=Mode.SUBTRACT)

    # Esboço21 → Ressalto-extrusão7 (add)
    with BuildSketch(Plane(origin=(0, 0, 0), x_dir=(1, 0, 0), z_dir=(0, 1, 0))):
        with Locations((-1, 0)):
            Rectangle(ESBO_O21_W, ESBO_O21_H)
    extrude(amount=RESSALTO_EXTRUS_O7_DEPTH)

    # Esboço22 → Corte-extrusão11 (cut)
    with BuildSketch(Plane(origin=(12, 0, 0), x_dir=(0, 0, -1), z_dir=(1, 0, 0))):
        Polygon((6.812733176, 30), (3.406366588, 35.9), (-3.406366588, 35.9), (-6.812733176, 30), (-3.406366588, 24.1), (3.406366588, 24.1), align=None)
    extrude(amount=-CORTE_EXTRUS_O11_DEPTH, mode=Mode.SUBTRACT)

    # Esboço24 → Ressalto-extrusão8 (add)
    # profile 1 of 2: a face of its own
    with BuildSketch(Plane(origin=(0, 0, 0), x_dir=(1, 0, 0), z_dir=(0, 1, 0))):
        with BuildLine():
            Line((17.282291959, 14), (32.482291959, 14))
            ThreePointArc((32.482291959, 14), (34.482291959, 12), (32.482291959, 10))
            Line((32.482291959, 10), (17.282291959, 10))
            ThreePointArc((17.282291959, 10), (15.282291959, 12), (17.282291959, 14))
        make_face()
        with Locations(Location((17.282291959, 12, 0), (0, 0, 180))):
            Circle(ESBO_O24_R, mode=Mode.SUBTRACT)
        with Locations(Location((32.482291959, 12, 0), (0, 0, 180))):
            Circle(ESBO_O24_R, mode=Mode.SUBTRACT)
    # profile 2 of 2: a face of its own
    with BuildSketch(Plane(origin=(0, 0, 0), x_dir=(1, 0, 0), z_dir=(0, 1, 0))):
        with Locations((24.882291959, -8.5)):
            Rectangle(ESBO_O24_W, ESBO_O24_H)
    extrude(amount=RESSALTO_EXTRUS_O8_DEPTH)

    # Esboço25 → Corte-extrusão12 (cut)
    with BuildSketch(Plane(origin=(0, 3, 0), x_dir=(1, 0, 0), z_dir=(0, 1, 0))):
        with Locations((24.882291959, 12)):
            Rectangle(ESBO_O25_W, ESBO_O25_H)
    extrude(amount=-CORTE_EXTRUS_O12_DEPTH, mode=Mode.SUBTRACT)

    # Esboço26 → Corte-extrusão13 (cut, through all)
    with BuildSketch(Plane.XY.offset(29)):
        with Locations((36, 5)):
            Circle(ESBO_O26_R)
    extrude(amount=-CORTE_EXTRUS_O13_DEPTH, mode=Mode.SUBTRACT)

    # Esboço27 → Ressalto-extrusão9 (add)
    with BuildSketch(Plane(origin=(0, 0, 0), x_dir=(1, 0, 0), z_dir=(0, 1, 0))):
        with Locations((-4, 16)):
            Rectangle(ESBO_O27_W, ESBO_O27_H)
    extrude(amount=RESSALTO_EXTRUS_O9_DEPTH)

    # Esboço28 → Ressalto-extrusão10 (add)
    with BuildSketch(Plane(origin=(0, 6, 0), x_dir=(1, 0, 0), z_dir=(0, 1, 0))):
        with Locations((-15.25, 16)):
            Rectangle(ESBO_O28_W, ESBO_O28_H)
        with Locations((7.25, 16)):
            Rectangle(ESBO_O28_W, ESBO_O28_H)
    extrude(amount=RESSALTO_EXTRUS_O10_DEPTH)

    # Esboço31 → Corte-extrusão14 (cut, through all)
    with BuildSketch(Plane.XY.offset(8)):
        with Locations((-10, 22.5)):
            Circle(ESBO_O31_R)
        with Locations((8, 22.5)):
            Circle(ESBO_O31_R)
    extrude(amount=-CORTE_EXTRUS_O14_DEPTH, mode=Mode.SUBTRACT)

    # Esboço32 → Corte-extrusão15 (cut)
    with BuildSketch(Plane.ZY.offset(46)):
        with Locations(Location((-26.5, -2.5, 0), (0, 0, 270))):
            Circle(ESBO_O32_R)
        with Locations(Location((-26.5, 19, 0), (0, 0, 270))):
            Circle(ESBO_O32_R)
        with Locations(Location((26.5, 19, 0), (0, 0, 90))):
            Circle(ESBO_O32_R)
        with Locations(Location((26.5, -2.5, 0), (0, 0, 90))):
            Circle(ESBO_O32_R)
    corte_extrus_o15 = extrude(amount=-CORTE_EXTRUS_O15_DEPTH, mode=Mode.SUBTRACT)

    # Esboço33 → Corte-extrusão16 (cut)
    with BuildSketch(Plane.ZY.offset(46)):
        with Locations(Location((-26.5, -2.5, 0), (0, 0, 270))):
            Circle(ESBO_O33_R)
        with Locations(Location((-26.5, 19, 0), (0, 0, 270))):
            Circle(ESBO_O33_R)
        with Locations(Location((26.5, 19, 0), (0, 0, 90))):
            Circle(ESBO_O33_R)
        with Locations(Location((26.5, -2.5, 0), (0, 0, 90))):
            Circle(ESBO_O33_R)
    corte_extrus_o16 = extrude(amount=-CORTE_EXTRUS_O16_DEPTH, mode=Mode.SUBTRACT)

    # Esboço34 → Corte-extrusão17 (cut)
    with BuildSketch(Plane.ZY.offset(46)):
        with BuildLine():
            Line((-26.5, -0.25), (-29, -0.25))
            Line((-29, -0.25), (-29, -5))
            Line((-29, -5), (-24.25, -5))
            Line((-24.25, -5), (-24.25, -2.5))
            ThreePointArc((-24.25, -2.5), (-24.909009742, -0.909009742), (-26.5, -0.25))
        make_face()
        with BuildLine():
            Line((-26.5, 21.25), (-29, 21.25))
            Line((-29, 21.25), (-29, 16.75))
            Line((-29, 16.75), (-26.5, 16.75))
            ThreePointArc((-26.5, 16.75), (-24.25, 19), (-26.5, 21.25))
        make_face()
        with BuildLine():
            Line((29, 16.75), (29, 21.25))
            Line((29, 21.25), (26.5, 21.25))
            ThreePointArc((26.5, 21.25), (24.25, 19), (26.5, 16.75))
            Line((26.5, 16.75), (29, 16.75))
        make_face()
        with BuildLine():
            Line((29, -5), (24.25, -5))
            Line((24.25, -5), (24.25, -2.5))
            ThreePointArc((24.25, -2.5), (24.909009742, -0.909009742), (26.5, -0.25))
            Line((26.5, -0.25), (29, -0.25))
            Line((29, -0.25), (29, -5))
        make_face()
    corte_extrus_o17 = extrude(amount=-CORTE_EXTRUS_O17_DEPTH, mode=Mode.SUBTRACT)

    # Espelhar2: Corte-extrusão15, Corte-extrusão16, Corte-extrusão17 across plane
    add(corte_extrus_o15.mirror(Plane(origin=(0, 0, 0), x_dir=(0, 0, 1), z_dir=(1, 0, 0))), mode=Mode.SUBTRACT)
    add(corte_extrus_o16.mirror(Plane(origin=(0, 0, 0), x_dir=(0, 0, 1), z_dir=(1, 0, 0))), mode=Mode.SUBTRACT)
    add(corte_extrus_o17.mirror(Plane(origin=(0, 0, 0), x_dir=(0, 0, 1), z_dir=(1, 0, 0))), mode=Mode.SUBTRACT)

    # Esboço37 → Corte-extrusão19 (cut, through all)
    with BuildSketch(Plane(origin=(-41, 0, 0), x_dir=(0, 0, -1), z_dir=(1, 0, 0))):
        with Locations((0, 30)):
            Circle(ESBO_O37_R)
    extrude(amount=CORTE_EXTRUS_O19_DEPTH, mode=Mode.SUBTRACT)


solid = part.part
